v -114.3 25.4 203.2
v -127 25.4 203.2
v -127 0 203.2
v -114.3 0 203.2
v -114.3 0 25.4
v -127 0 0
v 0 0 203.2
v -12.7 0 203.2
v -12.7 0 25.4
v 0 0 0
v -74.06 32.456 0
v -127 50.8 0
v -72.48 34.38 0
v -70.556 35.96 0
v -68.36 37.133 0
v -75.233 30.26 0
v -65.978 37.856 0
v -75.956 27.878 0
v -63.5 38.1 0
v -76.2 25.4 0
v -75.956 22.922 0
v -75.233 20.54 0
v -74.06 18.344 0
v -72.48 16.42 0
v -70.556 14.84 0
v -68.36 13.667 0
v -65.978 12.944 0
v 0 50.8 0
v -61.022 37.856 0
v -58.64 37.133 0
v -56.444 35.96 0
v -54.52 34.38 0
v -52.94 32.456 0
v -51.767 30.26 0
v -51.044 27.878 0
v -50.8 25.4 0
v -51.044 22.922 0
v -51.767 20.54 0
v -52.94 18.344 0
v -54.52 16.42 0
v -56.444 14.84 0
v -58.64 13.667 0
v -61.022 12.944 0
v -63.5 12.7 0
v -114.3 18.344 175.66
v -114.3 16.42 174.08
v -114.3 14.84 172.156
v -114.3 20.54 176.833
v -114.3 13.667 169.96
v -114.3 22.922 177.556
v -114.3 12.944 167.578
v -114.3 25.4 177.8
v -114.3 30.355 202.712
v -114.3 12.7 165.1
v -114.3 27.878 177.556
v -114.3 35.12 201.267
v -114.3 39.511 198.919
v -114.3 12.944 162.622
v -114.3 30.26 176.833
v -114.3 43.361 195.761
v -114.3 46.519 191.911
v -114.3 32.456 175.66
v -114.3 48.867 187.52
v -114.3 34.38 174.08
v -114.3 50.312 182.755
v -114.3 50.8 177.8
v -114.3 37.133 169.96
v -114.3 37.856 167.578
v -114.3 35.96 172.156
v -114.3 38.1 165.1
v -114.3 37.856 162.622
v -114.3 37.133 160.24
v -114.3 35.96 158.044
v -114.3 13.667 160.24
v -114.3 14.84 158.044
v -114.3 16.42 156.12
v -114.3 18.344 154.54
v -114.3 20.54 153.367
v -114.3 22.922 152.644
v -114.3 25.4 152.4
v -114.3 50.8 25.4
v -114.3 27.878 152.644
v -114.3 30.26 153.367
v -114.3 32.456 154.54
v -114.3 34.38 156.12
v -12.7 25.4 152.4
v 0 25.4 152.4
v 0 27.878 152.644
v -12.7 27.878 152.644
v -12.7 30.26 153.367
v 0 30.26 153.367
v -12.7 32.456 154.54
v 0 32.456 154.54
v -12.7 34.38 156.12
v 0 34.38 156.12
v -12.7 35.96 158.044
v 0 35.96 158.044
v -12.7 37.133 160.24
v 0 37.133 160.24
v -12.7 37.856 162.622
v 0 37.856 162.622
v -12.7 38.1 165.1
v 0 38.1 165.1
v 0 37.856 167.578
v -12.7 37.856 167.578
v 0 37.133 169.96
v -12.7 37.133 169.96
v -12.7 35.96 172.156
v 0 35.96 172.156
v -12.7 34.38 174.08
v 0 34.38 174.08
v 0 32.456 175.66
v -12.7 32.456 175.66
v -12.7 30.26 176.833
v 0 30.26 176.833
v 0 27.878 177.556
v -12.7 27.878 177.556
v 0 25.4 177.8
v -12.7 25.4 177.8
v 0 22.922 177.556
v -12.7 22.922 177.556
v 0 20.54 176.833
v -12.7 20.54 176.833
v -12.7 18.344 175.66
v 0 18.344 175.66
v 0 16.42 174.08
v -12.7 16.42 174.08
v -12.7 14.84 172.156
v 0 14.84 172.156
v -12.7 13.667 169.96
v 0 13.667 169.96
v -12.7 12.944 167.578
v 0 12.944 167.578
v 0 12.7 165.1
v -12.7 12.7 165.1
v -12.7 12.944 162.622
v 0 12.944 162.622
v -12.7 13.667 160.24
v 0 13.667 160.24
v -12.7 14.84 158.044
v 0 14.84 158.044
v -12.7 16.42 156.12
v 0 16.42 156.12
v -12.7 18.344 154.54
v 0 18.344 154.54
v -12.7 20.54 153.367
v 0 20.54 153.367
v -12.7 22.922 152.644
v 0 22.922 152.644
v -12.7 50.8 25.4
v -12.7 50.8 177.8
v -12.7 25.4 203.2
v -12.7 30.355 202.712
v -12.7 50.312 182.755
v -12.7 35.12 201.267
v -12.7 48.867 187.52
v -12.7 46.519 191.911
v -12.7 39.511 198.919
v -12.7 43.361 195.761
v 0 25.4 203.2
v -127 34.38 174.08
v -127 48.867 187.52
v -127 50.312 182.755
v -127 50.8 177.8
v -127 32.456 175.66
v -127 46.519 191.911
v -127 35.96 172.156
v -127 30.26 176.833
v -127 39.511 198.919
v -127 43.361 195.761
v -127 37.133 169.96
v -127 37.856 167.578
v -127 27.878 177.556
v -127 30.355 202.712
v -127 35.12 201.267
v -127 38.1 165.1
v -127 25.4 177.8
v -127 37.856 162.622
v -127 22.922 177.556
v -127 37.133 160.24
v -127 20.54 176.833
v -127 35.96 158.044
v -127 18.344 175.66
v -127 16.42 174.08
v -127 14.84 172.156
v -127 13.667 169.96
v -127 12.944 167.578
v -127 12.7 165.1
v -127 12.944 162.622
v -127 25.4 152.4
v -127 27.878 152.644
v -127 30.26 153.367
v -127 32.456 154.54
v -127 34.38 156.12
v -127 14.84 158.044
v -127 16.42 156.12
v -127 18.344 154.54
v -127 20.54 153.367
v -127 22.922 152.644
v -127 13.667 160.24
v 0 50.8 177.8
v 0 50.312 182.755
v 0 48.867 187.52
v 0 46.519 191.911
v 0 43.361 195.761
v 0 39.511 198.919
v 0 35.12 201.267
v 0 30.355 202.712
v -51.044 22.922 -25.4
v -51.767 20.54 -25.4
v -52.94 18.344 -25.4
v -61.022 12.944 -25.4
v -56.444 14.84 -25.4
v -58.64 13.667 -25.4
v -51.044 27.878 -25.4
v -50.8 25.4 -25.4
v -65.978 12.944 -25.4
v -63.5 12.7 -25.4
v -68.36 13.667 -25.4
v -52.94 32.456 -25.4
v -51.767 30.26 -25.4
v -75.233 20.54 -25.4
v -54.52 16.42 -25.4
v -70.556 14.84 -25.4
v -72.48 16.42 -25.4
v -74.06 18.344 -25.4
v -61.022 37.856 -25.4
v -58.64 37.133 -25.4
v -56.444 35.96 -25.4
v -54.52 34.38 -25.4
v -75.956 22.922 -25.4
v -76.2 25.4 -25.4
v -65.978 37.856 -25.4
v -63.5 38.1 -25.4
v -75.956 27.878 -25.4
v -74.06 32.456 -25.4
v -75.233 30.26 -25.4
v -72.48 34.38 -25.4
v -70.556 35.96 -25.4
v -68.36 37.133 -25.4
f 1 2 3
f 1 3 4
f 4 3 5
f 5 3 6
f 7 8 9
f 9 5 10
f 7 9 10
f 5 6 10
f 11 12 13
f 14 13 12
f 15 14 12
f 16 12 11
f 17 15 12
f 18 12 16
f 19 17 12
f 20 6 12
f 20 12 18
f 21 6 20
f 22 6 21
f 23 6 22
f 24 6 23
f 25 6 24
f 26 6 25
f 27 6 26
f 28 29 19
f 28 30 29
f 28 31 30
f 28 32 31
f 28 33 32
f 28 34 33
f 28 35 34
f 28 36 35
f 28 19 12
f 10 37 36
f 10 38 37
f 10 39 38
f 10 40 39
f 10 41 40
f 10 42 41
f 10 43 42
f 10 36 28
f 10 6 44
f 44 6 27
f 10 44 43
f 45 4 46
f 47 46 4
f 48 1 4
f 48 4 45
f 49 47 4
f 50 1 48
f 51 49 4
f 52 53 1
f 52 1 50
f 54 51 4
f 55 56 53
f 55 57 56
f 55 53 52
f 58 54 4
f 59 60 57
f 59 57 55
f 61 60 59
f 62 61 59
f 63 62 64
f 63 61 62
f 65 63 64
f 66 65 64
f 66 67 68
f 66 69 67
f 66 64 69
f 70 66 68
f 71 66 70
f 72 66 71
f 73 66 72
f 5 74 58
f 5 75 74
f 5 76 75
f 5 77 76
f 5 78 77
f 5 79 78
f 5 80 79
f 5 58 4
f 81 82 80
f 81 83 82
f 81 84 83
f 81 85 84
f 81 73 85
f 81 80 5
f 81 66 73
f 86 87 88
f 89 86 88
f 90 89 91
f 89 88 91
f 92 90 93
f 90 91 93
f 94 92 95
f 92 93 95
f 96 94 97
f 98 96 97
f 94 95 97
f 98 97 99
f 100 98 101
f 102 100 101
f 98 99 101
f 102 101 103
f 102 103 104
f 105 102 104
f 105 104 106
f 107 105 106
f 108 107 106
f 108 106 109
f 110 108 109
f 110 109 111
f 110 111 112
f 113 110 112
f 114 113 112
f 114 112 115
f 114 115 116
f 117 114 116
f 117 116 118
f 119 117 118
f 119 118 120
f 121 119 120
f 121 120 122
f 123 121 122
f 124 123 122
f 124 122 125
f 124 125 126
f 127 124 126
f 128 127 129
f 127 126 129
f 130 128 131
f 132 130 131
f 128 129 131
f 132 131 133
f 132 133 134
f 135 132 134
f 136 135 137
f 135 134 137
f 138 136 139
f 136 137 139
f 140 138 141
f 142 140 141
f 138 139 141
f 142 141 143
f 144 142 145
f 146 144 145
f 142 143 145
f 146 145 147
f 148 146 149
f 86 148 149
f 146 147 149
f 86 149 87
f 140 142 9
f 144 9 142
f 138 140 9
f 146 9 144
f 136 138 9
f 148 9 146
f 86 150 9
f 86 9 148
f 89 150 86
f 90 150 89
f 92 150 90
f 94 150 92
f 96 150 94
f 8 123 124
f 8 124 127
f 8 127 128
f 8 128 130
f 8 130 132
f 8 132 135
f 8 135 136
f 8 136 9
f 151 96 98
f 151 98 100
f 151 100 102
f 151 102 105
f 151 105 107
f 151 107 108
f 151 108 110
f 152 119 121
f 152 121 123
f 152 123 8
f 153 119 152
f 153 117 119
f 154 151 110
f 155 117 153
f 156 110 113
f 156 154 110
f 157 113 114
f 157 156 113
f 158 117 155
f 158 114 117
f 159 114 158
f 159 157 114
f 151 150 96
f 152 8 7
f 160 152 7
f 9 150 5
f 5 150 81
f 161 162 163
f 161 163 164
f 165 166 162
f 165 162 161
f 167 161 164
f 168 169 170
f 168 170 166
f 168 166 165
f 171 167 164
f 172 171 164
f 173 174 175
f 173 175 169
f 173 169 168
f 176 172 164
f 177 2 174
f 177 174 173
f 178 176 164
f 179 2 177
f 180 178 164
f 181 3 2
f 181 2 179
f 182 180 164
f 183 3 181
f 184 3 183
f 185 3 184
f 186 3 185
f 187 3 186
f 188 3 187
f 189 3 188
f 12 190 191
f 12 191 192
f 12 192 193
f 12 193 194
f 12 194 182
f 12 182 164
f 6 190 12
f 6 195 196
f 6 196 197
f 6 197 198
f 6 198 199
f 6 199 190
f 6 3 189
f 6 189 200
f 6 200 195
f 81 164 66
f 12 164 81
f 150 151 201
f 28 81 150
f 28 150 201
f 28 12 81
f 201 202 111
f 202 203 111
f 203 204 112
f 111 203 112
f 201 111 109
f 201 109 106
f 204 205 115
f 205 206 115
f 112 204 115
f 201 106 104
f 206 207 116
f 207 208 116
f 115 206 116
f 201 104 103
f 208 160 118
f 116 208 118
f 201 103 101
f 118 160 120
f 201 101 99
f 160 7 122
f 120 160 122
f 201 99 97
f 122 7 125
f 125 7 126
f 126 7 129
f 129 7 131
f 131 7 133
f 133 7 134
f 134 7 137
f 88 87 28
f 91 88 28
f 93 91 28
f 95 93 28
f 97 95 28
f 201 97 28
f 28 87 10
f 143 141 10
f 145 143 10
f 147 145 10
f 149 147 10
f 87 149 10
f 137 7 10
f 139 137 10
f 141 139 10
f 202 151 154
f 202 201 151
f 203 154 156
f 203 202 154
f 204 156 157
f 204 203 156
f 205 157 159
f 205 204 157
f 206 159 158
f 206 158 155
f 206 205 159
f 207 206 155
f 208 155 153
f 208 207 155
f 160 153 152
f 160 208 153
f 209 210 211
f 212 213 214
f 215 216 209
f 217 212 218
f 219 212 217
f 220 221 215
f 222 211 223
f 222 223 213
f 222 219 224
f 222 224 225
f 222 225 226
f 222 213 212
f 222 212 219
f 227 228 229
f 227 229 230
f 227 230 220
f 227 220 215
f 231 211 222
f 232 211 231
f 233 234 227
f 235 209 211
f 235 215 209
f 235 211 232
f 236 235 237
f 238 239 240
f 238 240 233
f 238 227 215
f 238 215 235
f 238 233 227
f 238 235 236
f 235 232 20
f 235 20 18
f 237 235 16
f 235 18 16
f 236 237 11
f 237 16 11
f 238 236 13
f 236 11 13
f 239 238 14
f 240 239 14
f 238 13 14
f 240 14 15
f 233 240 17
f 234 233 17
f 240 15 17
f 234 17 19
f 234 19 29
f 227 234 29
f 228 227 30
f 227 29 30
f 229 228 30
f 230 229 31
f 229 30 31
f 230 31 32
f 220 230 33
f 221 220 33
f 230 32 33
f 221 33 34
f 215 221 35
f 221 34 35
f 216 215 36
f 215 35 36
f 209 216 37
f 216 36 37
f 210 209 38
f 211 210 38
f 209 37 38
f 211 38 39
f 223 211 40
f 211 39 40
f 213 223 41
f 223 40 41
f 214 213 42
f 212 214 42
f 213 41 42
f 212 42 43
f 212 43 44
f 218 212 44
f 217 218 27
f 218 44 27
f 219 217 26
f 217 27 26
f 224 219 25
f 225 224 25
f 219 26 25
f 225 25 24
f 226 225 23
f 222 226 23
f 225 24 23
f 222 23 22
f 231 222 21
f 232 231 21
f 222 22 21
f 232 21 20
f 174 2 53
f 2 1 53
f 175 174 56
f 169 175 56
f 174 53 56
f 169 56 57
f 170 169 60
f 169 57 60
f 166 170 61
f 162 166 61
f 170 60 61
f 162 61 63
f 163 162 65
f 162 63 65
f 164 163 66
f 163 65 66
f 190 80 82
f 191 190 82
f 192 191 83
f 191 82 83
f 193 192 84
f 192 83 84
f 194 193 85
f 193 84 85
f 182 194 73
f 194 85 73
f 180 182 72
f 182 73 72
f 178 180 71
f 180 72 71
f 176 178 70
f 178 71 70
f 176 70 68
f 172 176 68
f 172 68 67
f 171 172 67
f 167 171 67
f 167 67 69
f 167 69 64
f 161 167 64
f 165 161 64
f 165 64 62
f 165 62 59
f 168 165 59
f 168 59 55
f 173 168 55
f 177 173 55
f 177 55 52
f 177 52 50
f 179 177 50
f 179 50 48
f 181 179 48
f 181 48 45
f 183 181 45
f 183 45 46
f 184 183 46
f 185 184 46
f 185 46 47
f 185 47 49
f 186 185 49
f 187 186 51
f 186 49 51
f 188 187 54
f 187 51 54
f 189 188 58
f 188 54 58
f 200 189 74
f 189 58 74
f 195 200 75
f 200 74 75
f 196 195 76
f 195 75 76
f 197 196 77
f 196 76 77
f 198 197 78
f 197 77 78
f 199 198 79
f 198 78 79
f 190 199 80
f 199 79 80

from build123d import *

# Parameters (mm, degrees)
SKETCH1_W           = 127
SKETCH1_H           = 203.2
BOSS_EXTRUDE1_DEPTH = 50.8
CUT_EXTRUDE1_DEPTH  = 254
SKETCH4_R           = 12.7
CUT_EXTRUDE2_DEPTH  = 254
SKETCH5_R           = 12.7
BOSS_EXTRUDE2_DEPTH = 25.4
FILLET1_R           = 25.4
FILLET2_R           = 25.4


with BuildPart() as part:
    # Sketch1 → Boss-Extrude1 (new body)
    with BuildSketch(Plane(origin=(0, 0, 0), x_dir=(1, 0, 0), z_dir=(0, 1, 0))):
        with Locations((-63.5, -101.6)):
            Rectangle(SKETCH1_W, SKETCH1_H)
    extrude(amount=BOSS_EXTRUDE1_DEPTH)

    # Sketch3 → Cut-Extrude1 (cut)
    with BuildSketch(Plane(origin=(0, 50.8, 0), x_dir=(1, 0, 0), z_dir=(0, 1, 0))):
        Polygon((-63.5, -25.4), (-12.7, -25.4), (-12.7, -203.2), (-114.3, -203.2), (-114.3, -25.4), align=None)
    extrude(amount=-CUT_EXTRUDE1_DEPTH, mode=Mode.SUBTRACT)

    # Sketch4 → Cut-Extrude2 (cut)
    with BuildSketch(Plane(origin=(0, 0, 0), x_dir=(0, 0, -1), z_dir=(1, 0, 0))):
        with Locations((-165.1, 25.4)):
            Circle(SKETCH4_R)
    extrude(amount=-CUT_EXTRUDE2_DEPTH, mode=Mode.SUBTRACT)

    # Sketch5 → Boss-Extrude2 (add)
    with BuildSketch(Plane(origin=(0, 0, 0), x_dir=(-1, 0, 0), z_dir=(0, 0, -1))):
        with Locations((63.5, 25.4)):
            Circle(SKETCH5_R)
    extrude(amount=BOSS_EXTRUDE2_DEPTH)

    # Fillet1
    fillet1_edges = [part.edges().sort_by_distance(p)[0] for p in [
        (-120.65, 50.8, 203.2),
    ]]
    fillet(fillet1_edges, radius=FILLET1_R)

    # Fillet2
    fillet2_edges = [part.edges().sort_by_distance(p)[0] for p in [
        (-6.35, 50.8, 203.2),
    ]]
    fillet(fillet2_edges, radius=FILLET2_R)


solid = part.part
